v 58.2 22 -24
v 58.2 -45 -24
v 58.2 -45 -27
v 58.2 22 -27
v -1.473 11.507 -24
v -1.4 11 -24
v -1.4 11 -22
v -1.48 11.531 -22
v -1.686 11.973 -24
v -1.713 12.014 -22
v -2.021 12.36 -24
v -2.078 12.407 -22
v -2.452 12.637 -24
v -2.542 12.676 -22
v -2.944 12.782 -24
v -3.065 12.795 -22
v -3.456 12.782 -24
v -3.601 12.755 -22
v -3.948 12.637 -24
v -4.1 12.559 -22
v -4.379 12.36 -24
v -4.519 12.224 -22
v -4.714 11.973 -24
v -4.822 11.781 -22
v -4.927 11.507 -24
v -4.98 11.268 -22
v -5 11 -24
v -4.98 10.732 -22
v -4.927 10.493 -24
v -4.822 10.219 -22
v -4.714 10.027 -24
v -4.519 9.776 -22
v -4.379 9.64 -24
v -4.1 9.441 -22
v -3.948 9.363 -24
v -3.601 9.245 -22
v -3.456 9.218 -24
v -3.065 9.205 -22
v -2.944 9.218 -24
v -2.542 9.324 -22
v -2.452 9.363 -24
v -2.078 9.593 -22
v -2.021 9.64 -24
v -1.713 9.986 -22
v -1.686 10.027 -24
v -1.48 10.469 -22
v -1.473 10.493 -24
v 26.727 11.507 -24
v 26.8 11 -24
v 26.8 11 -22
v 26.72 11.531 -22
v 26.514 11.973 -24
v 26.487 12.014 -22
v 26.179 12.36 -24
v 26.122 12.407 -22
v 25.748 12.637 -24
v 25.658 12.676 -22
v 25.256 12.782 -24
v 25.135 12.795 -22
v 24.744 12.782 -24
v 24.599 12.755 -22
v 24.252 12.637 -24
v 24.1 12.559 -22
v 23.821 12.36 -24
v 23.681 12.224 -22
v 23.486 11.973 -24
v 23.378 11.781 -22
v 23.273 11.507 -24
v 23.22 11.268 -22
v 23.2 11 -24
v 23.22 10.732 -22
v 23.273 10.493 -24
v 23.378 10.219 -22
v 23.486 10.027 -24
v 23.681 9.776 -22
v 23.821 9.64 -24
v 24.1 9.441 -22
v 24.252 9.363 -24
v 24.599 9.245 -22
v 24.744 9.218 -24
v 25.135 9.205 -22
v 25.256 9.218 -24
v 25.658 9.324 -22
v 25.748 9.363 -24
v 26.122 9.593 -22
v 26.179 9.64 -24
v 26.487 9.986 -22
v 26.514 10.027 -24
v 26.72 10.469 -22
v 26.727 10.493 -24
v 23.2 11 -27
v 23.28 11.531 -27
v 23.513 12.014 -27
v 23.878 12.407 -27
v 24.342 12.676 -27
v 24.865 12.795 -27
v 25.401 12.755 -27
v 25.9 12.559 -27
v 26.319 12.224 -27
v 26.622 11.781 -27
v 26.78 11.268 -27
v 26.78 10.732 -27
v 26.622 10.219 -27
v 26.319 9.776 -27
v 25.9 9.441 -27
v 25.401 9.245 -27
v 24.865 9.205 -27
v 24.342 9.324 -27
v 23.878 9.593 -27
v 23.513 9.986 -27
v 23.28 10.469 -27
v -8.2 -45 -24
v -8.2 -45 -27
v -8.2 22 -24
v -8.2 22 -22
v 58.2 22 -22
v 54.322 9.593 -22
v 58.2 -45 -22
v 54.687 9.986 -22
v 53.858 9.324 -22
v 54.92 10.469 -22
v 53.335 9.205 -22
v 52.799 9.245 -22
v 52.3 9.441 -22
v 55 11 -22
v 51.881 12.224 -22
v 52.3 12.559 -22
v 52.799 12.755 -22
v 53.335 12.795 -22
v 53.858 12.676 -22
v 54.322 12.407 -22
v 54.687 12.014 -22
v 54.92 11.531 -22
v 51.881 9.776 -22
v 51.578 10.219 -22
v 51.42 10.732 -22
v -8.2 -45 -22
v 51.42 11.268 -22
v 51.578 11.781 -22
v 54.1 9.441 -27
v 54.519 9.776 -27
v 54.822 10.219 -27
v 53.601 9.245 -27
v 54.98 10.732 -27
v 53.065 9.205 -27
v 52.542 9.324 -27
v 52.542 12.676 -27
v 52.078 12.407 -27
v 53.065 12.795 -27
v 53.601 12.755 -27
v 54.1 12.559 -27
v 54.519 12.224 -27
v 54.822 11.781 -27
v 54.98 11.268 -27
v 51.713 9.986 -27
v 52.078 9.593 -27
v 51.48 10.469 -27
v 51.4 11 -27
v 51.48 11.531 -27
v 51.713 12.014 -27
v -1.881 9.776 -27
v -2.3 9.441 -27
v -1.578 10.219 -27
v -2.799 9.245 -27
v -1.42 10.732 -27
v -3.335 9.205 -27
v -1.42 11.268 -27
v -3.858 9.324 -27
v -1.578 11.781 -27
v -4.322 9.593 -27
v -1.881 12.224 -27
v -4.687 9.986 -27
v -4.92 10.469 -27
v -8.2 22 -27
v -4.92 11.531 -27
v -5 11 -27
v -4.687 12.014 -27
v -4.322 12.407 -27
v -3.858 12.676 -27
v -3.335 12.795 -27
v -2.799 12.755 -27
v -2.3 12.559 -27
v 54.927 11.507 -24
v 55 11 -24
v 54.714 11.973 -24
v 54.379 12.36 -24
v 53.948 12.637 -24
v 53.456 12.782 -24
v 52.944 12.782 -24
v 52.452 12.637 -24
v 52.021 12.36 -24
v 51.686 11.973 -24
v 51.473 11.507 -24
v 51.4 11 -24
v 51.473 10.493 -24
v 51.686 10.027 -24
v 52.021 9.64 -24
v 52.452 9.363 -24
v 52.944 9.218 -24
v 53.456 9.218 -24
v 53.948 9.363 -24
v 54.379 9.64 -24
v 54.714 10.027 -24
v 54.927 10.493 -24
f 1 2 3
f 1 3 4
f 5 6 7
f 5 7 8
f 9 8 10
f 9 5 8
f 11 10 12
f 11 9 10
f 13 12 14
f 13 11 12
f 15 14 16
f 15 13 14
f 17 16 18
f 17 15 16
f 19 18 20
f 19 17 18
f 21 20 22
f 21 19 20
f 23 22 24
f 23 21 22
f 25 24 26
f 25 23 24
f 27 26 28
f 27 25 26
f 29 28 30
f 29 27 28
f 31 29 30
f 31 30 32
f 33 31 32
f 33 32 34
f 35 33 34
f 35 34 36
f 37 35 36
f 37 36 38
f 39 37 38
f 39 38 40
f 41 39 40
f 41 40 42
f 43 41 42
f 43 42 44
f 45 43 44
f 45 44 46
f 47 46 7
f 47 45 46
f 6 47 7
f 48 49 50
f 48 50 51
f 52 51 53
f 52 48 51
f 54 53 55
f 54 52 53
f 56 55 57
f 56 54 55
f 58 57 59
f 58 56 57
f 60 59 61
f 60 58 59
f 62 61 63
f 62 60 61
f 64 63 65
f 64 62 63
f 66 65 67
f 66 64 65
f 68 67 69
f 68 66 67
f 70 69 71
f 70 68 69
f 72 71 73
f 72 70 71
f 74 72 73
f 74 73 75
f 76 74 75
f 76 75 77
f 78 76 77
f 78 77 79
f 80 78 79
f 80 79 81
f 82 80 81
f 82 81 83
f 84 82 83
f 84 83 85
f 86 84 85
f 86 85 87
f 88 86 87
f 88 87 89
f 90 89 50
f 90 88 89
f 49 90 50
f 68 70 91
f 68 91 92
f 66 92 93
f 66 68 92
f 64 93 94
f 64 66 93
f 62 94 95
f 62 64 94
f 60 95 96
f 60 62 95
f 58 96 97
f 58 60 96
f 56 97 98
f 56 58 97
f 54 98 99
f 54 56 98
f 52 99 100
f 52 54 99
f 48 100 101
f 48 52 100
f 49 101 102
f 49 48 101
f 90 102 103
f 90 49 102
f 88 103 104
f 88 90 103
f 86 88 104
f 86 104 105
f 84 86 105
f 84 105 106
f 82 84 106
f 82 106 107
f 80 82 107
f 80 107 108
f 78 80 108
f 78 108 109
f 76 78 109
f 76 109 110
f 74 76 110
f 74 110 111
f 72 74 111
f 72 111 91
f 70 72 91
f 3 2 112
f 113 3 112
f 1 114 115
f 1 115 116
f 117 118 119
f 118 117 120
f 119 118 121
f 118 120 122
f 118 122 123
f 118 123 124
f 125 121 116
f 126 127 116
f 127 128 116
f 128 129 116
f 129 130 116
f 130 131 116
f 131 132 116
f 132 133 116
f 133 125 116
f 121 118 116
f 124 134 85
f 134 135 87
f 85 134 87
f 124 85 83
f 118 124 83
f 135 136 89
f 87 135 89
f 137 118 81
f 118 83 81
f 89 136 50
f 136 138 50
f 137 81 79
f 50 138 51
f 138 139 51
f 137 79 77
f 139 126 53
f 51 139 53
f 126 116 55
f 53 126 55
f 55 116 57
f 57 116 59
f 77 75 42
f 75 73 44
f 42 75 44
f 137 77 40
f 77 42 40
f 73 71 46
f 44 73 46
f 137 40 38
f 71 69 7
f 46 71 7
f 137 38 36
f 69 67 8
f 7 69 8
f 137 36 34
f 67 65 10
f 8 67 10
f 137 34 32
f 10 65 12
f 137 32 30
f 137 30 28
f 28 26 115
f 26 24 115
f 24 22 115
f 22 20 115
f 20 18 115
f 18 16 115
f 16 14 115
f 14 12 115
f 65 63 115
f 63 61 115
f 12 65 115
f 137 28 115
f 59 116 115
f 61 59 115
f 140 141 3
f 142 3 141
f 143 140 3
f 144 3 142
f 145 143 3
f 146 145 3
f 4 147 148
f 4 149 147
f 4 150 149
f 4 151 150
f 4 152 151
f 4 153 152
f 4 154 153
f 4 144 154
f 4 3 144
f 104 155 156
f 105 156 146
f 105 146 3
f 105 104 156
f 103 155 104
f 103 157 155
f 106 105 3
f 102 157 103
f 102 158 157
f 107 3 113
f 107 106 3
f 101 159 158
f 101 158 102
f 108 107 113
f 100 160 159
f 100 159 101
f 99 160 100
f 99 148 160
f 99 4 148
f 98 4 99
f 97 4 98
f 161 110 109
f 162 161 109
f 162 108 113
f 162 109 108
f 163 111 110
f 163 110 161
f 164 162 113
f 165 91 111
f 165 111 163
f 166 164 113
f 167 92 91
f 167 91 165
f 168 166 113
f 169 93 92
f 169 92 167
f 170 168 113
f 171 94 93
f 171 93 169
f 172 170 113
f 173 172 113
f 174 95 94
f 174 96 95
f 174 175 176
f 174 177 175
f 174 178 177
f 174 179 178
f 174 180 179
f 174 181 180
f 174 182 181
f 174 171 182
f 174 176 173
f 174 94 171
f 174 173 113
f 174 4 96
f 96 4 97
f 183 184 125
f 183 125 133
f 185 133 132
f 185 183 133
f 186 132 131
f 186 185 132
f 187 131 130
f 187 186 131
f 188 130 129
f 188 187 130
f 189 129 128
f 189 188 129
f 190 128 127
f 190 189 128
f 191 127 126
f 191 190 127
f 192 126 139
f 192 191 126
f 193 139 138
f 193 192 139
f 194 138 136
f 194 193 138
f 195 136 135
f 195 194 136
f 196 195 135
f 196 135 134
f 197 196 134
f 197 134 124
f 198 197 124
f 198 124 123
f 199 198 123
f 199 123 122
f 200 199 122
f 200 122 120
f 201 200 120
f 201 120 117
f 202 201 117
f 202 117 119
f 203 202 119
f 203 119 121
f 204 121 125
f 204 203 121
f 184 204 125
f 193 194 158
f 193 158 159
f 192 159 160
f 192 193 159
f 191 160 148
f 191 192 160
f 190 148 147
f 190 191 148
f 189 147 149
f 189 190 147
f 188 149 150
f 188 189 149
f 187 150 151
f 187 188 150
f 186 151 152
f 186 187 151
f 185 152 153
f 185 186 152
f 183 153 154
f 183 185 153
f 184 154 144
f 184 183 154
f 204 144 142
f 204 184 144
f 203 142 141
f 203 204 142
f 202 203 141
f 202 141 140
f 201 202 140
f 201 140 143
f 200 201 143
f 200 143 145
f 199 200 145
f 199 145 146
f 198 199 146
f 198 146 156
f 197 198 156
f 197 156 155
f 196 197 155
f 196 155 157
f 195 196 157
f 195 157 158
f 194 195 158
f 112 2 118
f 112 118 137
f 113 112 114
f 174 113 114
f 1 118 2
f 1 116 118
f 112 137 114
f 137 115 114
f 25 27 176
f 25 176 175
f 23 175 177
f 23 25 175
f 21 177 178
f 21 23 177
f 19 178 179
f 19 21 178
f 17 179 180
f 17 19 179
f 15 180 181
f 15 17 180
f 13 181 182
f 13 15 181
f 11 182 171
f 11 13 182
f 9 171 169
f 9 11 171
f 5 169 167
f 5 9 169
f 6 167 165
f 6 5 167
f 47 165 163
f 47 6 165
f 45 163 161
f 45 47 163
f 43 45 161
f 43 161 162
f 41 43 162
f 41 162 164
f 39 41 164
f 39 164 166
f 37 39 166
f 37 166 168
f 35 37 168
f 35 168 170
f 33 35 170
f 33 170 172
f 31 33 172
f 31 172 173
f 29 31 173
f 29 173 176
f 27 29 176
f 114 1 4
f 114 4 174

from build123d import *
from build123d.topology import SkipClean

# Parameters (mm, degrees)
SKETCH1_W                = 50
SKETCH1_H                = 9.1
BOSS_EXTRUDE1_DEPTH      = 2
SKETCH2_W                = 25
SKETCH2_H                = 6.6
CUT_EXTRUDE1_DEPTH       = 2
SKETCH3_R                = 1.8
CUT_EXTRUDE2_DEPTH       = 2
SKETCH4_W                = 66.4
SKETCH4_H                = 130
BOSS_EXTRUDE2_DEPTH      = 2
SKETCH5_W                = 66.4
SKETCH5_H                = 2
BOSS_EXTRUDE3_DEPTH      = 2.5
SKETCH6_W                = 8.6
SKETCH6_H                = 62.5
BOSS_EXTRUDE4_DEPTH      = 2
SKETCH7_R                = 1.8
SKETCH7_W                = 3
SKETCH7_H                = 5
CUT_EXTRUDE3_DEPTH       = 2
SKETCH8_W                = 25
SKETCH8_H                = 45
CUT_EXTRUDE4_DEPTH       = 20
SKETCH9_W                = 25
SKETCH9_H                = 10
BOSS_EXTRUDE5_DEPTH      = 2
SKETCH10_W               = 34.7
SKETCH10_H               = 27.07
BOSS_EXTRUDE6_DEPTH      = 2
SKETCH11_R               = 1.8
CUT_EXTRUDE5_DEPTH       = 2
SKETCH12_R               = 1.8
CUT_EXTRUDE6_DEPTH       = 2
SKETCH13_W               = 2
SKETCH13_H               = 2
BOSS_EXTRUDE7_DEPTH      = 44
SKETCH14_W               = 2
SKETCH14_H               = 2
BOSS_EXTRUDE8_DEPTH      = 46
SKETCH16_W               = 42
SKETCH16_H               = 43
BOSS_EXTRUDE10_DEPTH     = 2
SKETCH18_R               = 1.8
CUT_EXTRUDE7_DEPTH       = 2
BOSS_EXTRUDE12_DEPTH     = 2
SKETCH21_W               = 2
SKETCH21_H               = 2
BOSS_EXTRUDE13_DEPTH     = 10
SKETCH25_W               = 3
SKETCH25_H               = 5
CUT_EXTRUDE8_DEPTH       = 10
SKETCH26_W               = 6.2
SKETCH26_H               = 13
SKETCH26_W_2             = 21
SKETCH26_H_2             = 6.6
BOSS_EXTRUDE14_DEPTH     = 2
SKETCH27_W               = 2
SKETCH27_H               = 27
SKETCH27_H_2             = 24.93
BOSS_EXTRUDE15_DEPTH     = 2
SKETCH29_W               = 10
SKETCH29_H               = 10
BOSS_EXTRUDE19_DEPTH     = 2
SKETCH41_R               = 1.8
CUT_EXTRUDE15_DEPTH      = 2
BOSS_EXTRUDE26_DEPTH     = 2
SKETCH43_W               = 70.4
SKETCH43_H               = 2
BOSS_EXTRUDE27_DEPTH     = 11
SKETCH44_W               = 10
SKETCH44_H               = 5
BOSS_EXTRUDE28_DEPTH     = 2
SKETCH45_R               = 1.8
BOSS_EXTRUDE29_DEPTH     = 2
SKETCH46_R               = 1.8
CUT_EXTRUDE16_DEPTH      = 2
SKETCH47_W               = 10
SKETCH47_H               = 1
BOSS_EXTRUDE30_DEPTH     = 2
SKETCH48_W               = 32.7
SKETCH48_H               = 31.07
SKETCH48_W_2             = 101.75
SKETCH48_H_2             = 120.487369876
CUT_EXTRUDE17_DEPTH      = 20
SKETCH50_W               = 66.4
SKETCH50_H               = 81.07
CUT_EXTRUDE19_DEPTH      = 20
SKETCH51_W               = 70.4
SKETCH51_H               = 85.07
SKETCH51_W_2             = 66.4
SKETCH51_H_2             = 81.07
BOSS_EXTRUDE31_DEPTH     = 20
SKETCH52_W               = 10
SKETCH52_H               = 1
BOSS_EXTRUDE32_DEPTH     = 2
SKETCH53_W               = 10
SKETCH53_H               = 4
CUT_EXTRUDE20_DEPTH      = 2
BOSS_EXTRUDE33_START     = 1
SKETCH54_W               = 10
SKETCH54_H               = 12
SKETCH54_R               = 1.8
BOSS_EXTRUDE33_DEPTH     = 1
CUT_EXTRUDE23_DEPTH      = 96
CUT_EXTRUDE23_DEPTH_BACK = 16
SKETCH59_R               = 1.8
SKETCH62_W               = 66.985033768
SKETCH62_H               = 11.249394984
BOSS_EXTRUDE38_DEPTH     = 1
SKETCH65_R               = 1.8
CUT_EXTRUDE27_DEPTH      = 3
SKETCH66_R               = 1
CUT_EXTRUDE28_DEPTH      = 87
BOSS_EXTRUDE41_DEPTH     = 2
BOSS_EXTRUDE42_DEPTH     = 2
BOSS_EXTRUDE43_DEPTH     = 2
SKETCH68_W               = 6.791832398
SKETCH68_H               = 8.144168394
SKETCH68_W_2             = 5.485710784
SKETCH68_W_3             = 7.764004839
SKETCH68_H_2             = 11.628907231
BOSS_EXTRUDE44_DEPTH     = 2
BOSS_EXTRUDE45_DEPTH     = 2
SKETCH70_R               = 1.8
CUT_EXTRUDE29_DEPTH      = 83
SKETCH72_W               = 105.024650177
SKETCH72_H               = 68.649418558
CUT_EXTRUDE33_DEPTH      = 92
SKETCH73_W               = 2
SKETCH73_H               = 22
CUT_EXTRUDE34_DEPTH      = 92
SKETCH74_W               = 66.4
SKETCH74_H               = 2
BOSS_EXTRUDE46_DEPTH     = 45
SKETCH75_W               = 66.4
SKETCH75_H               = 67
SKETCH75_R               = 1.8
BOSS_EXTRUDE47_DEPTH     = 3


with BuildPart() as part:
    # Sketch1 → Boss-Extrude1 (new body)
    with BuildSketch(Plane(origin=(0, 0, 0), x_dir=(1, 0, 0), z_dir=(0, 1, 0))):
        with Locations((25, 4.55)):
            Rectangle(SKETCH1_W, SKETCH1_H)
    extrude(amount=BOSS_EXTRUDE1_DEPTH)

    # Sketch2 → Cut-Extrude1 (cut)
    with BuildSketch(Plane(origin=(0, 2, 0), x_dir=(1, 0, 0), z_dir=(0, 1, 0))):
        with Locations((25, 5.8)):
            Rectangle(SKETCH2_W, SKETCH2_H)
    extrude(amount=-CUT_EXTRUDE1_DEPTH, mode=Mode.SUBTRACT)

    # Sketch3 → Cut-Extrude2 (cut)
    with BuildSketch(Plane(origin=(0, 2, 0), x_dir=(1, 0, 0), z_dir=(0, 1, 0))):
        with Locations(Location((6.25, 5.8, 0), (0, 0, 270))):
            Circle(SKETCH3_R)
        with Locations(Location((43.75, 5.8, 0), (0, 0, 270))):
            Circle(SKETCH3_R)
    extrude(amount=-CUT_EXTRUDE2_DEPTH, mode=Mode.SUBTRACT)

    # Sketch4 → Boss-Extrude2 (add)
    with BuildSketch(Plane(origin=(0, 2, 0), x_dir=(1, 0, 0), z_dir=(0, 1, 0))):
        with Locations((25, -65)):
            Rectangle(SKETCH4_W, SKETCH4_H)
    extrude(amount=-BOSS_EXTRUDE2_DEPTH)

    # Sketch5 → Boss-Extrude3 (add)
    with BuildSketch(Plane.XY.offset(130)):
        with Locations((25, 1)):
            Rectangle(SKETCH5_W, SKETCH5_H)
    extrude(amount=BOSS_EXTRUDE3_DEPTH)

    # Sketch6 → Boss-Extrude4 (add)
    with BuildSketch(Plane(origin=(0, 2, 0), x_dir=(1, 0, 0), z_dir=(0, 1, 0))):
        with Locations((-12.5, -101.25)):
            Rectangle(SKETCH6_W, SKETCH6_H)
        with Locations((62.5, -101.25)):
            Rectangle(SKETCH6_W, SKETCH6_H)
    extrude(amount=-BOSS_EXTRUDE4_DEPTH)

    # Sketch7 → Cut-Extrude3 (cut)
    with BuildSketch(Plane(origin=(0, 2, 0), x_dir=(1, 0, 0), z_dir=(0, 1, 0))):
        with Locations(Location((-13.5, -77, 0), (0, 0, 270))):
            Circle(SKETCH7_R)
        with Locations(Location((-13.5, -101.25, 0), (0, 0, 270))):
            Circle(SKETCH7_R)
        with Locations(Location((-13.5, -125.5, 0), (0, 0, 270))):
            Circle(SKETCH7_R)
        with Locations(Location((63.5, -77, 0), (0, 0, 270))):
            Circle(SKETCH7_R)
        with Locations(Location((63.5, -101.25, 0), (0, 0, 270))):
            Circle(SKETCH7_R)
        with Locations(Location((63.5, -125.5, 0), (0, 0, 270))):
            Circle(SKETCH7_R)
        with Locations((-13.5, -117.5)):
            Rectangle(SKETCH7_W, SKETCH7_H)
        with Locations((63.5, -117.5)):
            Rectangle(SKETCH7_W, SKETCH7_H)
    extrude(amount=-CUT_EXTRUDE3_DEPTH, mode=Mode.SUBTRACT)

    # Sketch8 → Cut-Extrude4 (cut)
    with BuildSketch(Plane(origin=(0, 2, 0), x_dir=(1, 0, 0), z_dir=(0, 1, 0))):
        with Locations((25, -22.5)):
            Rectangle(SKETCH8_W, SKETCH8_H)
    extrude(amount=-CUT_EXTRUDE4_DEPTH, mode=Mode.SUBTRACT)

    # Sketch9 → Boss-Extrude5 (add)
    with BuildSketch(Plane(origin=(0, 2, 0), x_dir=(1, 0, 0), z_dir=(0, 1, 0))):
        with Locations((25, -5)):
            Rectangle(SKETCH9_W, SKETCH9_H)
    extrude(amount=-BOSS_EXTRUDE5_DEPTH)

    # Sketch10 → Boss-Extrude6 (add)
    with BuildSketch(Plane(origin=(0, 2, 0), x_dir=(1, 0, 0), z_dir=(0, 1, 0))):
        with Locations((-25.55, -29.535)):
            Rectangle(SKETCH10_W, SKETCH10_H)
        with Locations((75.55, -29.535)):
            Rectangle(SKETCH10_W, SKETCH10_H)
    extrude(amount=-BOSS_EXTRUDE6_DEPTH)

    # Sketch11 → Cut-Extrude5 (cut)
    with BuildSketch(Plane(origin=(0, 2, 0), x_dir=(1, 0, 0), z_dir=(0, 1, 0))):
        with Locations(Location((-36.9, -19.25, 0), (0, 0, 270))):
            Circle(SKETCH11_R)
        with Locations(Location((-36.9, -39.82, 0), (0, 0, 270))):
            Circle(SKETCH11_R)
        with Locations(Location((-22.6, -19.25, 0), (0, 0, 270))):
            Circle(SKETCH11_R)
        with Locations(Location((-22.6, -39.82, 0), (0, 0, 270))):
            Circle(SKETCH11_R)
    extrude(amount=-CUT_EXTRUDE5_DEPTH, mode=Mode.SUBTRACT)

    # Sketch12 → Cut-Extrude6 (cut)
    with BuildSketch(Plane(origin=(0, 2, 0), x_dir=(1, 0, 0), z_dir=(0, 1, 0))):
        with Locations(Location((72.6, -19.25, 0), (0, 0, 270))):
            Circle(SKETCH12_R)
        with Locations(Location((86.9, -19.25, 0), (0, 0, 270))):
            Circle(SKETCH12_R)
        with Locations(Location((72.6, -39.82, 0), (0, 0, 270))):
            Circle(SKETCH12_R)
        with Locations(Location((86.9, -39.82, 0), (0, 0, 270))):
            Circle(SKETCH12_R)
    extrude(amount=-CUT_EXTRUDE6_DEPTH, mode=Mode.SUBTRACT)

    # Sketch13 → Boss-Extrude7 (add)
    with BuildSketch(Plane.ZY.offset(42.9)):
        with Locations((15, 1)):
            Rectangle(SKETCH13_W, SKETCH13_H)
        with Locations((44.07, 1)):
            Rectangle(SKETCH13_W, SKETCH13_H)
    extrude(amount=-BOSS_EXTRUDE7_DEPTH)

    # Sketch14 → Boss-Extrude8 (add)
    with BuildSketch(Plane(origin=(92.9, 0, 0), x_dir=(0, 0, -1), z_dir=(1, 0, 0))):
        with Locations((-15, 1)):
            Rectangle(SKETCH14_W, SKETCH14_H)
        with Locations((-44.07, 1)):
            Rectangle(SKETCH14_W, SKETCH14_H)
    extrude(amount=-BOSS_EXTRUDE8_DEPTH)

    # Sketch16 → Boss-Extrude10 (add)
    with BuildSketch(Plane(origin=(0, 2, 0), x_dir=(1, 0, 0), z_dir=(0, 1, 0))):
        with Locations((25, -154)):
            Rectangle(SKETCH16_W, SKETCH16_H)
    extrude(amount=-BOSS_EXTRUDE10_DEPTH)

    # Sketch18 → Cut-Extrude7 (cut)
    with BuildSketch(Plane(origin=(0, 2, 0), x_dir=(1, 0, 0), z_dir=(0, 1, 0))):
        with Locations(Location((8.74, -171.03, 0), (0, 0, 270))):
            Circle(SKETCH18_R)
        with Locations(Location((41.26, -171.03, 0), (0, 0, 270))):
            Circle(SKETCH18_R)
        with Locations(Location((8.74, -138.5, 0), (0, 0, 270))):
            Circle(SKETCH18_R)
        with Locations(Location((41.26, -138.5, 0), (0, 0, 270))):
            Circle(SKETCH18_R)
    extrude(amount=-CUT_EXTRUDE7_DEPTH, mode=Mode.SUBTRACT)

    # Sketch20 → Boss-Extrude12 (add)
    with BuildSketch(Plane(origin=(0, 2, 0), x_dir=(1, 0, 0), z_dir=(0, 1, 0))):
        with BuildLine():
            Line((-2, -132.5), (4, -132.5))
            Line((4, -132.5), (4, -138.5))
            ThreePointArc((4, -138.5), (2.242640687, -134.257359313), (-2, -132.5))
        make_face()
        with BuildLine():
            ThreePointArc((52, -132.5), (47.757359313, -134.257359313), (46, -138.5))
            Line((46, -138.5), (46, -132.5))
            Line((46, -132.5), (52, -132.5))
        make_face()
    extrude(amount=-BOSS_EXTRUDE12_DEPTH)

    # Sketch21 → Boss-Extrude13 (add)
    with BuildSketch(Plane(origin=(0, 0, -9.1), x_dir=(-1, 0, 0), z_dir=(0, 0, -1))):
        with Locations((-51, 1)):
            Rectangle(SKETCH21_W, SKETCH21_H)
        with Locations((-36.5, 1)):
            Rectangle(SKETCH21_W, SKETCH21_H)
        with Locations((-13.5, 1)):
            Rectangle(SKETCH21_W, SKETCH21_H)
        with Locations((1, 1)):
            Rectangle(SKETCH21_W, SKETCH21_H)
    extrude(amount=-BOSS_EXTRUDE13_DEPTH)

    # Sketch25 → Cut-Extrude8 (cut)
    with BuildSketch(Plane(origin=(0, 2, 0), x_dir=(1, 0, 0), z_dir=(0, 1, 0))):
        with Locations((-11.7, -22.5)):
            Rectangle(SKETCH25_W, SKETCH25_H)
        with Locations((-11.7, -36.57)):
            Rectangle(SKETCH25_W, SKETCH25_H)
        with Locations((61.7, -22.5)):
            Rectangle(SKETCH25_W, SKETCH25_H)
        with Locations((61.7, -36.57)):
            Rectangle(SKETCH25_W, SKETCH25_H)
    extrude(amount=-CUT_EXTRUDE8_DEPTH, mode=Mode.SUBTRACT)

    # Sketch26 → Boss-Extrude14 (add)
    with BuildSketch(Plane(origin=(0, 2, 0), x_dir=(1, 0, 0), z_dir=(0, 1, 0))):
        with Locations((-5.1, 6.5)):
            Rectangle(SKETCH26_W, SKETCH26_H)
        Polygon((-2, 13), (-2, 9.1), (14.5, 9.1), (35.5, 9.1), (52, 9.1), (52, 13), align=None)
        with Locations((25, 5.8)):
            Rectangle(SKETCH26_W_2, SKETCH26_H_2)
        with Locations((55.1, 6.5)):
            Rectangle(SKETCH26_W, SKETCH26_H)
    extrude(amount=-BOSS_EXTRUDE14_DEPTH)

    # Sketch27 → Boss-Extrude15 (add)
    with BuildSketch(Plane(origin=(0, 2, 0), x_dir=(1, 0, 0), z_dir=(0, 1, 0))):
        with Locations((-9.2, -0.5)):
            Rectangle(SKETCH27_W, SKETCH27_H)
        with Locations((-9.2, -57.535)):
            Rectangle(SKETCH27_W, SKETCH27_H_2)
        with Locations((59.2, -0.5)):
            Rectangle(SKETCH27_W, SKETCH27_H)
        with Locations((59.2, -57.535)):
            Rectangle(SKETCH27_W, SKETCH27_H_2)
    extrude(amount=-BOSS_EXTRUDE15_DEPTH)

    # Sketch29 → Boss-Extrude19 (add)
    with BuildSketch(Plane(origin=(0, 2, 0), x_dir=(1, 0, 0), z_dir=(0, 1, 0))):
        with Locations((-15.2, -9)):
            Rectangle(SKETCH29_W, SKETCH29_H)
        with Locations((-15.2, -50.07)):
            Rectangle(SKETCH29_W, SKETCH29_H)
        with Locations((65.2, -9)):
            Rectangle(SKETCH29_W, SKETCH29_H)
        with Locations((65.2, -50.07)):
            Rectangle(SKETCH29_W, SKETCH29_H)
    extrude(amount=-BOSS_EXTRUDE19_DEPTH)

    # Sketch41 → Cut-Extrude15 (cut)
    with BuildSketch(Plane(origin=(0, 2, 0), x_dir=(1, 0, 0), z_dir=(0, 1, 0))):
        with Locations(Location((-15.2, -9, 0), (0, 0, 270))):
            Circle(SKETCH41_R)
        with Locations(Location((-15.2, -50.07, 0), (0, 0, 270))):
            Circle(SKETCH41_R)
        with Locations(Location((65.2, -9, 0), (0, 0, 270))):
            Circle(SKETCH41_R)
        with Locations(Location((65.2, -50.07, 0), (0, 0, 270))):
            Circle(SKETCH41_R)
    extrude(amount=-CUT_EXTRUDE15_DEPTH, mode=Mode.SUBTRACT)

    # Sketch42 → Boss-Extrude26 (add)
    with BuildSketch(Plane(origin=(0, 2, 0), x_dir=(1, 0, 0), z_dir=(0, 1, 0))):
        with BuildLine():
            Line((-16.8, -70), (-10.2, -70))
            Line((-10.2, -70), (-10.2, -63.4))
            ThreePointArc((-10.2, -63.4), (-12.133095244, -68.066904756), (-16.8, -70))
        make_face()
        with BuildLine():
            Line((60.2, -63.4), (60.2, -70))
            Line((60.2, -70), (66.8, -70))
            ThreePointArc((66.8, -70), (62.133095244, -68.066904756), (60.2, -63.4))
        make_face()
    extrude(amount=-BOSS_EXTRUDE26_DEPTH)

    # Sketch43 → Boss-Extrude27 (add)
    with BuildSketch(Plane(origin=(0, 0, -13), x_dir=(-1, 0, 0), z_dir=(0, 0, -1))):
        with Locations((-25, 1)):
            Rectangle(SKETCH43_W, SKETCH43_H)
    extrude(amount=BOSS_EXTRUDE27_DEPTH)

    # Sketch44 → Boss-Extrude28 (add)
    with BuildSketch(Plane(origin=(0, 2, 0), x_dir=(1, 0, 0), z_dir=(0, 1, 0))):
        with Locations((-15.2, -57.57)):
            Rectangle(SKETCH44_W, SKETCH44_H)
        with Locations((65.2, -57.57)):
            Rectangle(SKETCH44_W, SKETCH44_H)
    extrude(amount=-BOSS_EXTRUDE28_DEPTH)

    # Sketch45 → Boss-Extrude29 (add)
    with BuildSketch(Plane(origin=(0, 2, 0), x_dir=(1, 0, 0), z_dir=(0, 1, 0))):
        with Locations((-15.2, -50.07)):
            Circle(SKETCH45_R)
        with Locations((65.2, -50.07)):
            Circle(SKETCH45_R)
    extrude(amount=-BOSS_EXTRUDE29_DEPTH)

    # Sketch46 → Cut-Extrude16 (cut)
    with BuildSketch(Plane(origin=(0, 2, 0), x_dir=(1, 0, 0), z_dir=(0, 1, 0))):
        with Locations(Location((-15.2, -55.07, 0), (0, 0, 270))):
            Circle(SKETCH46_R)
        with Locations(Location((65.2, -55.07, 0), (0, 0, 270))):
            Circle(SKETCH46_R)
    extrude(amount=-CUT_EXTRUDE16_DEPTH, mode=Mode.SUBTRACT)

    # Sketch47 → Boss-Extrude30 (add)
    with BuildSketch(Plane(origin=(0, 2, 0), x_dir=(1, 0, 0), z_dir=(0, 1, 0))):
        with Locations((-15.2, -3.5)):
            Rectangle(SKETCH47_W, SKETCH47_H)
        with Locations((-15.2, -60.57)):
            Rectangle(SKETCH47_W, SKETCH47_H)
        with Locations((65.2, -3.5)):
            Rectangle(SKETCH47_W, SKETCH47_H)
        with Locations((65.2, -60.57)):
            Rectangle(SKETCH47_W, SKETCH47_H)
    extrude(amount=-BOSS_EXTRUDE30_DEPTH)

    # Sketch48 → Cut-Extrude17 (cut)
    with BuildSketch(Plane(origin=(0, 2, 0), x_dir=(1, 0, 0), z_dir=(0, 1, 0))):
        with Locations((-26.55, -29.535)):
            Rectangle(SKETCH48_W, SKETCH48_H)
        with Locations((76.55, -29.535)):
            Rectangle(SKETCH48_W, SKETCH48_H)
        with Locations((30.675, -121.313684938)):
            Rectangle(SKETCH48_W_2, SKETCH48_H_2)
    extrude(amount=-CUT_EXTRUDE17_DEPTH, mode=Mode.SUBTRACT)

    # Sketch50 → Cut-Extrude19 (cut)
    with BuildSketch(Plane(origin=(0, 2, 0), x_dir=(1, 0, 0), z_dir=(0, 1, 0))):
        with Locations((25, -18.535)):
            Rectangle(SKETCH50_W, SKETCH50_H)
    extrude(amount=-CUT_EXTRUDE19_DEPTH, mode=Mode.SUBTRACT)

    # Sketch51 → Boss-Extrude31 (add)
    with BuildSketch(Plane(origin=(0, 2, 0), x_dir=(1, 0, 0), z_dir=(0, 1, 0))):
        with Locations((25, -18.535)):
            Rectangle(SKETCH51_W, SKETCH51_H)
        with Locations((25, -18.535)):
            Rectangle(SKETCH51_W_2, SKETCH51_H_2, mode=Mode.SUBTRACT)
    extrude(amount=BOSS_EXTRUDE31_DEPTH)

    # Sketch52 → Boss-Extrude32 (add)
    with BuildSketch(Plane(origin=(0, 2, 0), x_dir=(1, 0, 0), z_dir=(0, 1, 0))):
        with Locations((-15.2, -14.5)):
            Rectangle(SKETCH52_W, SKETCH52_H)
        with Locations((65.2, -14.5)):
            Rectangle(SKETCH52_W, SKETCH52_H)
    extrude(amount=-BOSS_EXTRUDE32_DEPTH)

    # Sketch53 → Cut-Extrude20 (cut)
    with BuildSketch(Plane(origin=(0, 2, 0), x_dir=(1, 0, 0), z_dir=(0, 1, 0))):
        with Locations((-15.2, -47.07)):
            Rectangle(SKETCH53_W, SKETCH53_H)
        with Locations((65.2, -47.07)):
            Rectangle(SKETCH53_W, SKETCH53_H)
    extrude(amount=-CUT_EXTRUDE20_DEPTH, mode=Mode.SUBTRACT)

    # Sketch54 → Boss-Extrude33 (add)
    # profile 1 of 4: a face of its own
    with BuildSketch(Plane(origin=(0, 2, 0), x_dir=(1, 0, 0), z_dir=(0, 1, 0)).offset(BOSS_EXTRUDE33_START)):
        with Locations((-15.2, -9)):
            Rectangle(SKETCH54_W, SKETCH54_H)
        with Locations(Location((-15.2, -9, 0), (0, 0, 270))):
            Circle(SKETCH54_R, mode=Mode.SUBTRACT)
    # profile 2 of 4: a face of its own
    with BuildSketch(Plane(origin=(0, 2, 0), x_dir=(1, 0, 0), z_dir=(0, 1, 0)).offset(BOSS_EXTRUDE33_START)):
        with Locations((-15.2, -55.07)):
            Rectangle(SKETCH54_W, SKETCH54_H)
        with Locations(Location((-15.2, -55.07, 0), (0, 0, 270))):
            Circle(SKETCH54_R, mode=Mode.SUBTRACT)
    # profile 3 of 4: a face of its own
    with BuildSketch(Plane(origin=(0, 2, 0), x_dir=(1, 0, 0), z_dir=(0, 1, 0)).offset(BOSS_EXTRUDE33_START)):
        with Locations((65.2, -9)):
            Rectangle(SKETCH54_W, SKETCH54_H)
        with Locations(Location((65.2, -9, 0), (0, 0, 270))):
            Circle(SKETCH54_R, mode=Mode.SUBTRACT)
    # profile 4 of 4: a face of its own
    with BuildSketch(Plane(origin=(0, 2, 0), x_dir=(1, 0, 0), z_dir=(0, 1, 0)).offset(BOSS_EXTRUDE33_START)):
        with Locations((65.2, -55.07)):
            Rectangle(SKETCH54_W, SKETCH54_H)
        with Locations(Location((65.2, -55.07, 0), (0, 0, 270))):
            Circle(SKETCH54_R, mode=Mode.SUBTRACT)
    extrude(amount=-BOSS_EXTRUDE33_DEPTH)

    # Sketch59 → Cut-Extrude23 (cut, two sides: drawn at the far end of the back side and taken through both)
    with BuildSketch(Plane.XY.offset(-22).offset(-CUT_EXTRUDE23_DEPTH_BACK)):
        with Locations((-3.2, 11)):
            Circle(SKETCH59_R)
        with Locations((53.2, 11)):
            Circle(SKETCH59_R)
        with Locations((25, 11)):
            Circle(SKETCH59_R)
    extrude(amount=CUT_EXTRUDE23_DEPTH + CUT_EXTRUDE23_DEPTH_BACK, mode=Mode.SUBTRACT)

    # Sketch62 → Boss-Extrude38 (add)
    with BuildSketch(Plane.XY.offset(61.07)):
        with Locations((24.914777311, 10.744331932)):
            Rectangle(SKETCH62_W, SKETCH62_H)
    extrude(amount=-BOSS_EXTRUDE38_DEPTH)

    # Sketch65 → Cut-Extrude27 (cut)
    with BuildSketch(Plane(origin=(0, 0, 59.07), x_dir=(-1, 0, 0), z_dir=(0, 0, -1))):
        with Locations((-13.8, 11)):
            Circle(SKETCH65_R)
        with Locations((-36.2, 11)):
            Circle(SKETCH65_R)
    extrude(amount=-CUT_EXTRUDE27_DEPTH, mode=Mode.SUBTRACT)

    # Sketch66 → Cut-Extrude28 (cut)
    with BuildSketch(Plane.ZY.offset(10.2)):
        with Locations((32.035, 16)):
            Circle(SKETCH66_R)
    extrude(amount=-CUT_EXTRUDE28_DEPTH, mode=Mode.SUBTRACT)

    # Sketch55 → Boss-Extrude41 (add)
    with BuildSketch(Plane(origin=(0, 0, 3), x_dir=(-1, 0, 0), z_dir=(0, 0, -1))):
        Polygon((20.2, 3), (10.2, 22), (10.2, 3), align=None)
        Polygon((-70.2, 3), (-60.2, 3), (-60.2, 22), align=None)
    extrude(amount=-BOSS_EXTRUDE41_DEPTH)

    # Sketch56 → Boss-Extrude42 (add)
    with BuildSketch(Plane.XY.offset(15)):
        Polygon((-20.2, 3), (-10.2, 3), (-10.2, 22), align=None)
        Polygon((70.2, 3), (60.2, 3), (60.2, 22), align=None)
    extrude(amount=-BOSS_EXTRUDE42_DEPTH)

    # Sketch57 → Boss-Extrude43 (add)
    with BuildSketch(Plane(origin=(0, 0, 49.07), x_dir=(-1, 0, 0), z_dir=(0, 0, -1))):
        Polygon((20.2, 3), (10.2, 3), (10.2, 22), align=None)
        Polygon((-70.2, 3), (-60.2, 3), (-60.2, 22), align=None)
    extrude(amount=-BOSS_EXTRUDE43_DEPTH)

    # Sketch68 → Boss-Extrude44 (add)
    with BuildSketch(Plane(origin=(0, 0, 59.07), x_dir=(-1, 0, 0), z_dir=(0, 0, -1))):
        with Locations((2.499419559, 10.346452983)):
            Rectangle(SKETCH68_W, SKETCH68_H)
        with Locations((-24.624372648, 10.346452983)):
            Rectangle(SKETCH68_W_2, SKETCH68_H)
        with Locations((-52.231743322, 12.088822401)):
            Rectangle(SKETCH68_W_3, SKETCH68_H_2)
    extrude(amount=-BOSS_EXTRUDE44_DEPTH)

    # Sketch69 → Boss-Extrude45 (add)
    with BuildSketch(Plane.XY.offset(61.07)):
        Polygon((-20.2, 3), (-10.2, 3), (-10.2, 22), align=None)
        Polygon((60.2, 3), (70.2, 3), (60.2, 22), align=None)
    extrude(amount=-BOSS_EXTRUDE45_DEPTH)

    # Sketch70 → Cut-Extrude29 (cut)
    with BuildSketch(Plane.ZY.offset(10.2)):
        with Locations((9, 17)):
            Circle(SKETCH70_R)
        with Locations((55.07, 17)):
            Circle(SKETCH70_R)
    extrude(amount=-CUT_EXTRUDE29_DEPTH, mode=Mode.SUBTRACT)

    # Sketch72 → Cut-Extrude33 (cut)
    with BuildSketch(Plane.XY.offset(-22)):
        with Locations((30.741682618, -12.324709279)):
            Rectangle(SKETCH72_W, SKETCH72_H)
    extrude(amount=CUT_EXTRUDE33_DEPTH, mode=Mode.SUBTRACT)

    # Sketch73 → Cut-Extrude34 (cut)
    with BuildSketch(Plane.XY.offset(-22)):
        with Locations((-9.2, 11)):
            Rectangle(SKETCH73_W, SKETCH73_H)
        with Locations((59.2, 11)):
            Rectangle(SKETCH73_W, SKETCH73_H)
    extrude(amount=-CUT_EXTRUDE34_DEPTH, mode=Mode.SUBTRACT)

    # Sketch74 → Boss-Extrude46 (add)
    with BuildSketch(Plane(origin=(0, 0, 0), x_dir=(-1, 0, 0), z_dir=(0, -1, 0))):
        with Locations((-25, 23)):
            Rectangle(SKETCH74_W, SKETCH74_H)
    extrude(amount=BOSS_EXTRUDE46_DEPTH)

    # Sketch75 → Boss-Extrude47 (add)
    with SkipClean():  # the faces are left unmerged after this step: merging them gives an invalid solid
        with BuildSketch(Plane(origin=(0, 0, -24), x_dir=(-1, 0, 0), z_dir=(0, 0, -1))):
            with Locations((-25, -11.5)):
                Rectangle(SKETCH75_W, SKETCH75_H)
            with Locations((-53.2, 11)):
                Circle(SKETCH75_R, mode=Mode.SUBTRACT)
            with Locations((-25, 11)):
                Circle(SKETCH75_R, mode=Mode.SUBTRACT)
            with Locations((3.2, 11)):
                Circle(SKETCH75_R, mode=Mode.SUBTRACT)
        extrude(amount=BOSS_EXTRUDE47_DEPTH)


solid = part.part
